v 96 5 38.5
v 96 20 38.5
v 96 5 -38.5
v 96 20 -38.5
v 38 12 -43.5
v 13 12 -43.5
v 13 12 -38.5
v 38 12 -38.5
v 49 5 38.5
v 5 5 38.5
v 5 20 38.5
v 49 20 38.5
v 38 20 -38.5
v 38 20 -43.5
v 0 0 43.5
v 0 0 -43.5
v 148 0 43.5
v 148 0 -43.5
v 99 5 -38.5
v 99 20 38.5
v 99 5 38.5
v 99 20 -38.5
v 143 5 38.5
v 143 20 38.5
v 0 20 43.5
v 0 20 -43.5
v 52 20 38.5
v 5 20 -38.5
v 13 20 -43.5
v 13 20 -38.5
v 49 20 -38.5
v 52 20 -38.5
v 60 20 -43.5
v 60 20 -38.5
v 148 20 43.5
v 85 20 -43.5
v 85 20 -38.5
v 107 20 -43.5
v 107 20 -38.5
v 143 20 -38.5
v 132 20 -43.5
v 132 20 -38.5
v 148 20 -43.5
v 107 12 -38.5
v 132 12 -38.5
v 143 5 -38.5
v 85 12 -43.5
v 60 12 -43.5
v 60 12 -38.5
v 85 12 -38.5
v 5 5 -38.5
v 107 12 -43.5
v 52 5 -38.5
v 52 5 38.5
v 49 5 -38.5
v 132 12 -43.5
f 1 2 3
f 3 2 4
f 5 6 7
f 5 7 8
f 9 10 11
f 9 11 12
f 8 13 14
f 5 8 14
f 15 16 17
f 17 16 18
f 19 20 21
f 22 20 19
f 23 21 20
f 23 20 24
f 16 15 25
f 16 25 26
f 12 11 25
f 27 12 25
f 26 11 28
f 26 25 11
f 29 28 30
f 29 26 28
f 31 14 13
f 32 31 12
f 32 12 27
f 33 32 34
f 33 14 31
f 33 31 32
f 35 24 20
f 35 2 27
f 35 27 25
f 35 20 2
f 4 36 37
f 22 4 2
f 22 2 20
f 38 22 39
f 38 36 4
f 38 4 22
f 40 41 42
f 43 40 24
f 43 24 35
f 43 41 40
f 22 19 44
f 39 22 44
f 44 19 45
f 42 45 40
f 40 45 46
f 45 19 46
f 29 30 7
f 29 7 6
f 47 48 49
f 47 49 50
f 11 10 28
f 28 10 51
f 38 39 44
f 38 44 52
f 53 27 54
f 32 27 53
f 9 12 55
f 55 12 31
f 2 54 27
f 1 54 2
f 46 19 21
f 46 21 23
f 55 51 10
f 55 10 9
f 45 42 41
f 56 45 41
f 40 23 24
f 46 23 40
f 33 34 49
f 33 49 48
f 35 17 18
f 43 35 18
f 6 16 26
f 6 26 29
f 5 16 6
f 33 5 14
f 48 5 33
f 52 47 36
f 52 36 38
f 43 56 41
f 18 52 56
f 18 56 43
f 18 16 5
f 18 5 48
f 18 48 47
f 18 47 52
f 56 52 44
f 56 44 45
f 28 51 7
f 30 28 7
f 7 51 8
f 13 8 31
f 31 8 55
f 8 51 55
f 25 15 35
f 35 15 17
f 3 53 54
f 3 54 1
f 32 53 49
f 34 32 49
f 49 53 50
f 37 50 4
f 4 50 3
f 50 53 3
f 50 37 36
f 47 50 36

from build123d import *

# Parameters (mm, degrees)
SKETCH1_W           = 148
SKETCH1_H           = 87
BOSS_EXTRUDE1_DEPTH = 20
SHELL1_T            = -5
BOSS_EXTRUDE2_REACH = 157.551
SKETCH2_W           = 3
SKETCH2_H           = 77
SKETCH3_W           = 25
SKETCH3_H           = 5
CUT_EXTRUDE1_DEPTH  = 8


with BuildPart() as part:
    # Sketch1 → Boss-Extrude1 (new body)
    with BuildSketch(Plane(origin=(0, 0, 0), x_dir=(1, 0, 0), z_dir=(0, 1, 0))):
        with Locations((74, 0)):
            Rectangle(SKETCH1_W, SKETCH1_H)
    extrude(amount=BOSS_EXTRUDE1_DEPTH)

    # Shell1
    shell1_openings = [part.faces().sort_by_distance(p)[0] for p in [
        (74, 20, 0),
    ]]
    offset(amount=SHELL1_T, openings=shell1_openings, kind=Kind.INTERSECTION)

    # Sketch2 → Boss-Extrude2 (add, up to next)
    with BuildSketch(Plane(origin=(0, 20, 0), x_dir=(1, 0, 0), z_dir=(0, 1, 0)), mode=Mode.PRIVATE) as boss_extrude2_sk1:
        with Locations((50.5, 0)):
            Rectangle(SKETCH2_W, SKETCH2_H)
    boss_extrude2_tool1 = extrude(boss_extrude2_sk1.sketch, amount=-BOSS_EXTRUDE2_REACH, mode=Mode.PRIVATE) - part.part
    # Sketch2 → Boss-Extrude2 (add, up to next)
    with BuildSketch(Plane(origin=(0, 20, 0), x_dir=(1, 0, 0), z_dir=(0, 1, 0)), mode=Mode.PRIVATE) as boss_extrude2_sk2:
        with Locations((97.5, 0)):
            Rectangle(SKETCH2_W, SKETCH2_H)
    boss_extrude2_tool2 = extrude(boss_extrude2_sk2.sketch, amount=-BOSS_EXTRUDE2_REACH, mode=Mode.PRIVATE) - part.part
    add(boss_extrude2_tool1.solids().sort_by_distance((50.5, 20, 0))[0])
    add(boss_extrude2_tool2.solids().sort_by_distance((97.5, 20, 0))[0])

    # Sketch3 → Cut-Extrude1 (cut)
    with BuildSketch(Plane(origin=(0, 20, 0), x_dir=(1, 0, 0), z_dir=(0, 1, 0))):
        with Locations((25.5, 41)):
            Rectangle(SKETCH3_W, SKETCH3_H)
        with Locations((72.5, 41)):
            Rectangle(SKETCH3_W, SKETCH3_H)
        with Locations((119.5, 41)):
            Rectangle(SKETCH3_W, SKETCH3_H)
    extrude(amount=-CUT_EXTRUDE1_DEPTH, mode=Mode.SUBTRACT)


solid = part.part
